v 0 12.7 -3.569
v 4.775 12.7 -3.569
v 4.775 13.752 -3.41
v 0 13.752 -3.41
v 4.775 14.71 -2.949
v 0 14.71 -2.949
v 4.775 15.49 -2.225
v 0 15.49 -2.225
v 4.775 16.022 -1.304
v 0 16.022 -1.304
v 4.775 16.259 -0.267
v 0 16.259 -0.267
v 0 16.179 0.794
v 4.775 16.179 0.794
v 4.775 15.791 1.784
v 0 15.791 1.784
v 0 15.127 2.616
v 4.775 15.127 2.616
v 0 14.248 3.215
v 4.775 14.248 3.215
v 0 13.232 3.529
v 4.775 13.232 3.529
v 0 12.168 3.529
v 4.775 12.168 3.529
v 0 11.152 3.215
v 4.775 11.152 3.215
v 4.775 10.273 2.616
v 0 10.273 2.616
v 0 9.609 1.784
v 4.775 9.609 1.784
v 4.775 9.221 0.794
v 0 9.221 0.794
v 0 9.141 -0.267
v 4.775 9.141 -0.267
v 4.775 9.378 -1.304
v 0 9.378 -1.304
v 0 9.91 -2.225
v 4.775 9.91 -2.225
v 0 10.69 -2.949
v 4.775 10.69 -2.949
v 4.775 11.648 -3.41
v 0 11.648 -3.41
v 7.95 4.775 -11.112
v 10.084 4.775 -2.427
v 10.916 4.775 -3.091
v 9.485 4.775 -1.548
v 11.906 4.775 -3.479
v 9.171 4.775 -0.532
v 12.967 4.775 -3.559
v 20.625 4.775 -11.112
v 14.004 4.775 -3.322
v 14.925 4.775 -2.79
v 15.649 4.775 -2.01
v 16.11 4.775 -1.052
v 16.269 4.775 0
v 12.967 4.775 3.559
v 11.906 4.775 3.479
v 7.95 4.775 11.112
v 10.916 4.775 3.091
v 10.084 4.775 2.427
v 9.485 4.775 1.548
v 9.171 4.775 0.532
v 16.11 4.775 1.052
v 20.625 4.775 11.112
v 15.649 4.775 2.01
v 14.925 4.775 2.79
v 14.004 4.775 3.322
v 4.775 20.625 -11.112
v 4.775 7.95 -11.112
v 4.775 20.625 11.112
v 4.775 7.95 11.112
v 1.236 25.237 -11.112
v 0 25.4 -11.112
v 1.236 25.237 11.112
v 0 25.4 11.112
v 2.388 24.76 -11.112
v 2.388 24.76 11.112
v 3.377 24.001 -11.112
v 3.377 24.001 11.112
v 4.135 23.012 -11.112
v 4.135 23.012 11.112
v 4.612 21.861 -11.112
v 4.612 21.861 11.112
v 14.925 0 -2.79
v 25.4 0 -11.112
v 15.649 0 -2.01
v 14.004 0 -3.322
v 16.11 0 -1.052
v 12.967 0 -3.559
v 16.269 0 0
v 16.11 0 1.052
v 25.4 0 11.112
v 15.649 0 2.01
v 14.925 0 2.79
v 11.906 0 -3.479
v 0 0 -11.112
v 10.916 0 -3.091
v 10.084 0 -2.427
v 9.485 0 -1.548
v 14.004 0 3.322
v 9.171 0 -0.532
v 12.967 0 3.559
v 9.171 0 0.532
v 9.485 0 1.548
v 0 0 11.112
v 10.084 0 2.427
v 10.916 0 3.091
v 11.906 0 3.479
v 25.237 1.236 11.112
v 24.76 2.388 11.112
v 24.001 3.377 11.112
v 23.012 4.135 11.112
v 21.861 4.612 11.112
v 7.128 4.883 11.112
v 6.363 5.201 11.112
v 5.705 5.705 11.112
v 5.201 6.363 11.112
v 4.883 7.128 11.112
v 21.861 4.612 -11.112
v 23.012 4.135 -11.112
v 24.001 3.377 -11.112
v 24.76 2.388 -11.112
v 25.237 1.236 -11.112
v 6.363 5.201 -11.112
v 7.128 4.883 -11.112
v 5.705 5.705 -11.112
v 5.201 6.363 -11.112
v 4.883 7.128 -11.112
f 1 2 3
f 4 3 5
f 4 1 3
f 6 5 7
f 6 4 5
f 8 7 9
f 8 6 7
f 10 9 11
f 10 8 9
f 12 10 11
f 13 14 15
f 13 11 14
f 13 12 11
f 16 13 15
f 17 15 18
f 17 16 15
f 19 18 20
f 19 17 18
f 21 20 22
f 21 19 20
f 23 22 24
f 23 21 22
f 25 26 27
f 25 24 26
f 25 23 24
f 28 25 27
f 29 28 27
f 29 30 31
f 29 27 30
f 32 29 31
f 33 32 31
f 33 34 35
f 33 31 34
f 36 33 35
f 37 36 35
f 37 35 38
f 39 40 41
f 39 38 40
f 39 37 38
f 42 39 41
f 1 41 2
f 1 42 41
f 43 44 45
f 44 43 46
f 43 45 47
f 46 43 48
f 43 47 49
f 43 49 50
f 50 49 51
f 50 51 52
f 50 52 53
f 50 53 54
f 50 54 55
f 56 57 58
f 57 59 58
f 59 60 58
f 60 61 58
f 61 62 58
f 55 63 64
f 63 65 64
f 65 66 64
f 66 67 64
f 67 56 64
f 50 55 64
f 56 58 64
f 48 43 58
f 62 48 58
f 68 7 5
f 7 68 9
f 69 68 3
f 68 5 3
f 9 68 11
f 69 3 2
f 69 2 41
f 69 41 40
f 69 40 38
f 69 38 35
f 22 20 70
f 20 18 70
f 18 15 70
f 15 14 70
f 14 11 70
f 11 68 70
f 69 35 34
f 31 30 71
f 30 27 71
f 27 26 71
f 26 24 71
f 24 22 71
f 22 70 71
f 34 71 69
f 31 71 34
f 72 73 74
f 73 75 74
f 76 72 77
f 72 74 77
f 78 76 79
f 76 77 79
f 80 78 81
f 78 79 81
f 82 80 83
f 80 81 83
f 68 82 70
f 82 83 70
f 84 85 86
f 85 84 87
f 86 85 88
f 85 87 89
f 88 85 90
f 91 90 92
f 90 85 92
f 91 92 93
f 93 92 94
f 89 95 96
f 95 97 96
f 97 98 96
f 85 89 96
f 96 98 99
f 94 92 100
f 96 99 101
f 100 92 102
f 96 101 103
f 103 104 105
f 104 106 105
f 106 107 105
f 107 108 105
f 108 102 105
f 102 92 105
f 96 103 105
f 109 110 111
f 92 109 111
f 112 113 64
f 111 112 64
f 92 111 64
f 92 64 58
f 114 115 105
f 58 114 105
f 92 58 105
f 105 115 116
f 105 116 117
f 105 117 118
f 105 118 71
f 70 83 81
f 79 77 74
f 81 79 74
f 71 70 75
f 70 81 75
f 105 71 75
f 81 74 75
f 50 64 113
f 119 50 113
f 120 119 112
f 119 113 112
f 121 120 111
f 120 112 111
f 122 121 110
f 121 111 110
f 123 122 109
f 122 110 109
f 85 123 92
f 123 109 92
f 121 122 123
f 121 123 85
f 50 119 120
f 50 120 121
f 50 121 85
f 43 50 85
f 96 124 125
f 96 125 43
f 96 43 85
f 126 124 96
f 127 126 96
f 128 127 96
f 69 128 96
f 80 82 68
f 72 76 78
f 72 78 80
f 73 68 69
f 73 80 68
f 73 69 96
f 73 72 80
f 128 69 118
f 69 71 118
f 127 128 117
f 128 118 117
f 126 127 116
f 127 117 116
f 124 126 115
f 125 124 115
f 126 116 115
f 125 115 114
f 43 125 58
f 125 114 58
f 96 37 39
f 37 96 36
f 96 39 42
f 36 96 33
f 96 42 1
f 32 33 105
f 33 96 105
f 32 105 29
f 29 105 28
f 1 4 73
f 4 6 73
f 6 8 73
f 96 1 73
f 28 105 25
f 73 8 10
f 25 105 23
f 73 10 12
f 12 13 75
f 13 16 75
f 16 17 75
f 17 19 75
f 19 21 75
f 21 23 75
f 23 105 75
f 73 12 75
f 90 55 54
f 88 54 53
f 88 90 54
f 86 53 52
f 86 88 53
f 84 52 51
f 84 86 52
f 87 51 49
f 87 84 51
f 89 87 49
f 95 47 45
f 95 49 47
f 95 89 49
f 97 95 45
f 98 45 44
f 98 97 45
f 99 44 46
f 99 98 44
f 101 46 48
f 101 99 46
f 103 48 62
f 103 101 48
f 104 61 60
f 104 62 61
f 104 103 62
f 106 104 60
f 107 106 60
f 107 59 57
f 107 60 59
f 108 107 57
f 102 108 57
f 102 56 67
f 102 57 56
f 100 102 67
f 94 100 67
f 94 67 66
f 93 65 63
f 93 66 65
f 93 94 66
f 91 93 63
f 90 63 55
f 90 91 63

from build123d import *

# Parameters (mm, degrees)
BOSS_EXTRUDE1_DEPTH = 11.1125
SKETCH2_R           = 3.5687
CUT_EXTRUDE1_DEPTH  = 26.4
SKETCH3_R           = 3.5687
CUT_EXTRUDE2_DEPTH  = 26.4


with BuildPart() as part:
    # Sketch1 → Boss-Extrude1 (new body, symmetric)
    with BuildSketch(Plane.XY):
        with BuildLine():
            Line((0, 0), (0, 25.4))
            ThreePointArc((0, 25.4), (3.376576302, 24.001376302), (4.7752, 20.6248))
            Line((4.7752, 20.6248), (4.7752, 7.9502))
            ThreePointArc((4.7752, 7.9502), (5.70513597, 5.70513597), (7.9502, 4.7752))
            Line((7.9502, 4.7752), (20.6248, 4.7752))
            ThreePointArc((20.6248, 4.7752), (24.001376302, 3.376576302), (25.4, 0))
            Line((25.4, 0), (0, 0))
        make_face()
    extrude(amount=BOSS_EXTRUDE1_DEPTH, both=True)

    # Sketch2 → Cut-Extrude1 (cut, through all)
    with BuildSketch(Plane(origin=(0, 0, 0), x_dir=(1, 0, 0), z_dir=(0, 1, 0))):
        with Locations((12.7, 0)):
            Circle(SKETCH2_R)
    extrude(amount=CUT_EXTRUDE1_DEPTH, mode=Mode.SUBTRACT)

    # Sketch3 → Cut-Extrude2 (cut, through all)
    with BuildSketch(Plane(origin=(0, 0, 0), x_dir=(0, 0, -1), z_dir=(1, 0, 0))):
        with Locations((0, 12.7)):
            Circle(SKETCH3_R)
    extrude(amount=CUT_EXTRUDE2_DEPTH, mode=Mode.SUBTRACT)


solid = part.part
